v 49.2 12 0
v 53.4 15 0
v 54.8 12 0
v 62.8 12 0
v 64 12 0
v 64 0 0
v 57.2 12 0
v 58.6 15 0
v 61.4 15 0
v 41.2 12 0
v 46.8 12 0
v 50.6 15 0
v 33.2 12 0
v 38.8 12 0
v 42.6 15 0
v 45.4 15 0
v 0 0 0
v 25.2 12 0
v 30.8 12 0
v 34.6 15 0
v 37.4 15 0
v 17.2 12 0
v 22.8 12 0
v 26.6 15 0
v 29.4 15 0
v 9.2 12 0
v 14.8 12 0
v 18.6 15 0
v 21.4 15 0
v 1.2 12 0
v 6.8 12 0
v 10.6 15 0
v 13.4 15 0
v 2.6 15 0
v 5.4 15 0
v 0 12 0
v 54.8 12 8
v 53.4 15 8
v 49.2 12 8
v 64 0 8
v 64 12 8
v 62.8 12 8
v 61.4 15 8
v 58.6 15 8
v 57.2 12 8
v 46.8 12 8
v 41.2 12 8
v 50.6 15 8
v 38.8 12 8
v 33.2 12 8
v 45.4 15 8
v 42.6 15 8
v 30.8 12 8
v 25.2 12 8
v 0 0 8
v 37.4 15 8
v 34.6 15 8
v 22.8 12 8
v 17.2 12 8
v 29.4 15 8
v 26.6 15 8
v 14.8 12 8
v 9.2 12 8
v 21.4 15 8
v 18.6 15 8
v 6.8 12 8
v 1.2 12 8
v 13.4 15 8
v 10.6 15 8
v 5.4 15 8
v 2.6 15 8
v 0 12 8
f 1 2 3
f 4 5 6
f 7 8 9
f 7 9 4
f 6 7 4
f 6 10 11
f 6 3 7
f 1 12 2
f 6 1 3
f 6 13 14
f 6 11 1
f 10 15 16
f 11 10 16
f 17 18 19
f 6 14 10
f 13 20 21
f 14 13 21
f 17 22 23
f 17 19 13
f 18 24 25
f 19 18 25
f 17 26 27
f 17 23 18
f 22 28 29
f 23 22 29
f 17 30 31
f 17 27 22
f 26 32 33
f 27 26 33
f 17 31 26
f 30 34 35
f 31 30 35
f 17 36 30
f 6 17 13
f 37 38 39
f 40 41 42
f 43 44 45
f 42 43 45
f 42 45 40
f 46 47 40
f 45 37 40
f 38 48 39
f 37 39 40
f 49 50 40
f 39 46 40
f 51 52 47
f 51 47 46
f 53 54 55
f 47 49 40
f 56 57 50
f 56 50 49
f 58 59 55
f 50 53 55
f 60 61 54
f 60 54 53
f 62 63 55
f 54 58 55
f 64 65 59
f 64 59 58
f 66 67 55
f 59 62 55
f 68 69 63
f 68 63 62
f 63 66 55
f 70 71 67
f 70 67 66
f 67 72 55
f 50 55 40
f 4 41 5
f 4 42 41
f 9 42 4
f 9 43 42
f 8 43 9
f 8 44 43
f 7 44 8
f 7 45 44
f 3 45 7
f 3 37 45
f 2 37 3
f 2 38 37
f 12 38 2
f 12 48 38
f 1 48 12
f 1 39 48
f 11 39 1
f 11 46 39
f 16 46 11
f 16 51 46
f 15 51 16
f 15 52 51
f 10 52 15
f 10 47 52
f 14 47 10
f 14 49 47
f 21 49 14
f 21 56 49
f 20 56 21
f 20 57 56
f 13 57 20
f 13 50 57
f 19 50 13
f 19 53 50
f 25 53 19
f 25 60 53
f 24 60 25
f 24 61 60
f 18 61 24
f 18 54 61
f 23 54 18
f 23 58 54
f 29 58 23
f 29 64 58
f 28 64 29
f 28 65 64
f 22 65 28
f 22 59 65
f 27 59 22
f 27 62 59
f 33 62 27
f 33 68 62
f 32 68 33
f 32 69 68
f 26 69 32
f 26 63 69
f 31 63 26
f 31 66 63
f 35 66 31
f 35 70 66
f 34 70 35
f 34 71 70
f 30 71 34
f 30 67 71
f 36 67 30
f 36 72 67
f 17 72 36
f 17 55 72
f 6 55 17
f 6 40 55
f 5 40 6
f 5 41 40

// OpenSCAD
$fn = 32;

// ----------------------------------------------------------------------
// Gear rack: 8 teeth, pitch 8 mm
// ----------------------------------------------------------------------

// --- parameters (mm) ---
teeth = 8;                // number of teeth
pitch = 8;                // tooth pitch, X
root_w = 5.6;             // tooth width at the root
tip_w = 2.8;              // tooth width at the tip
base_h = 12;              // rack body height, Y
tooth_h = 3;              // tooth height above the body
plate_t = 8;              // rack width, Z (extrusion height)

rack_l = teeth * pitch;  // overall length
total_h = base_h + tooth_h;  // overall height

profile = [[0, 0], [64, 0], [64, 12], [62.8, 12], [61.4, 15], [58.6, 15], [57.2, 12], [54.8, 12], [53.4, 15], [50.6, 15], [49.2, 12], [46.8, 12], [45.4, 15], [42.6, 15], [41.2, 12], [38.8, 12], [37.4, 15], [34.6, 15], [33.2, 12], [30.8, 12], [29.4, 15], [26.6, 15], [25.2, 12], [22.8, 12], [21.4, 15], [18.6, 15], [17.2, 12], [14.8, 12], [13.4, 15], [10.6, 15], [9.2, 12], [6.8, 12], [5.4, 15], [2.6, 15], [1.2, 12], [0, 12]];  // primary outline, 36 points, counter clockwise

// --- the one profile operation ---
linear_extrude(height = plate_t) polygon(points = profile);
